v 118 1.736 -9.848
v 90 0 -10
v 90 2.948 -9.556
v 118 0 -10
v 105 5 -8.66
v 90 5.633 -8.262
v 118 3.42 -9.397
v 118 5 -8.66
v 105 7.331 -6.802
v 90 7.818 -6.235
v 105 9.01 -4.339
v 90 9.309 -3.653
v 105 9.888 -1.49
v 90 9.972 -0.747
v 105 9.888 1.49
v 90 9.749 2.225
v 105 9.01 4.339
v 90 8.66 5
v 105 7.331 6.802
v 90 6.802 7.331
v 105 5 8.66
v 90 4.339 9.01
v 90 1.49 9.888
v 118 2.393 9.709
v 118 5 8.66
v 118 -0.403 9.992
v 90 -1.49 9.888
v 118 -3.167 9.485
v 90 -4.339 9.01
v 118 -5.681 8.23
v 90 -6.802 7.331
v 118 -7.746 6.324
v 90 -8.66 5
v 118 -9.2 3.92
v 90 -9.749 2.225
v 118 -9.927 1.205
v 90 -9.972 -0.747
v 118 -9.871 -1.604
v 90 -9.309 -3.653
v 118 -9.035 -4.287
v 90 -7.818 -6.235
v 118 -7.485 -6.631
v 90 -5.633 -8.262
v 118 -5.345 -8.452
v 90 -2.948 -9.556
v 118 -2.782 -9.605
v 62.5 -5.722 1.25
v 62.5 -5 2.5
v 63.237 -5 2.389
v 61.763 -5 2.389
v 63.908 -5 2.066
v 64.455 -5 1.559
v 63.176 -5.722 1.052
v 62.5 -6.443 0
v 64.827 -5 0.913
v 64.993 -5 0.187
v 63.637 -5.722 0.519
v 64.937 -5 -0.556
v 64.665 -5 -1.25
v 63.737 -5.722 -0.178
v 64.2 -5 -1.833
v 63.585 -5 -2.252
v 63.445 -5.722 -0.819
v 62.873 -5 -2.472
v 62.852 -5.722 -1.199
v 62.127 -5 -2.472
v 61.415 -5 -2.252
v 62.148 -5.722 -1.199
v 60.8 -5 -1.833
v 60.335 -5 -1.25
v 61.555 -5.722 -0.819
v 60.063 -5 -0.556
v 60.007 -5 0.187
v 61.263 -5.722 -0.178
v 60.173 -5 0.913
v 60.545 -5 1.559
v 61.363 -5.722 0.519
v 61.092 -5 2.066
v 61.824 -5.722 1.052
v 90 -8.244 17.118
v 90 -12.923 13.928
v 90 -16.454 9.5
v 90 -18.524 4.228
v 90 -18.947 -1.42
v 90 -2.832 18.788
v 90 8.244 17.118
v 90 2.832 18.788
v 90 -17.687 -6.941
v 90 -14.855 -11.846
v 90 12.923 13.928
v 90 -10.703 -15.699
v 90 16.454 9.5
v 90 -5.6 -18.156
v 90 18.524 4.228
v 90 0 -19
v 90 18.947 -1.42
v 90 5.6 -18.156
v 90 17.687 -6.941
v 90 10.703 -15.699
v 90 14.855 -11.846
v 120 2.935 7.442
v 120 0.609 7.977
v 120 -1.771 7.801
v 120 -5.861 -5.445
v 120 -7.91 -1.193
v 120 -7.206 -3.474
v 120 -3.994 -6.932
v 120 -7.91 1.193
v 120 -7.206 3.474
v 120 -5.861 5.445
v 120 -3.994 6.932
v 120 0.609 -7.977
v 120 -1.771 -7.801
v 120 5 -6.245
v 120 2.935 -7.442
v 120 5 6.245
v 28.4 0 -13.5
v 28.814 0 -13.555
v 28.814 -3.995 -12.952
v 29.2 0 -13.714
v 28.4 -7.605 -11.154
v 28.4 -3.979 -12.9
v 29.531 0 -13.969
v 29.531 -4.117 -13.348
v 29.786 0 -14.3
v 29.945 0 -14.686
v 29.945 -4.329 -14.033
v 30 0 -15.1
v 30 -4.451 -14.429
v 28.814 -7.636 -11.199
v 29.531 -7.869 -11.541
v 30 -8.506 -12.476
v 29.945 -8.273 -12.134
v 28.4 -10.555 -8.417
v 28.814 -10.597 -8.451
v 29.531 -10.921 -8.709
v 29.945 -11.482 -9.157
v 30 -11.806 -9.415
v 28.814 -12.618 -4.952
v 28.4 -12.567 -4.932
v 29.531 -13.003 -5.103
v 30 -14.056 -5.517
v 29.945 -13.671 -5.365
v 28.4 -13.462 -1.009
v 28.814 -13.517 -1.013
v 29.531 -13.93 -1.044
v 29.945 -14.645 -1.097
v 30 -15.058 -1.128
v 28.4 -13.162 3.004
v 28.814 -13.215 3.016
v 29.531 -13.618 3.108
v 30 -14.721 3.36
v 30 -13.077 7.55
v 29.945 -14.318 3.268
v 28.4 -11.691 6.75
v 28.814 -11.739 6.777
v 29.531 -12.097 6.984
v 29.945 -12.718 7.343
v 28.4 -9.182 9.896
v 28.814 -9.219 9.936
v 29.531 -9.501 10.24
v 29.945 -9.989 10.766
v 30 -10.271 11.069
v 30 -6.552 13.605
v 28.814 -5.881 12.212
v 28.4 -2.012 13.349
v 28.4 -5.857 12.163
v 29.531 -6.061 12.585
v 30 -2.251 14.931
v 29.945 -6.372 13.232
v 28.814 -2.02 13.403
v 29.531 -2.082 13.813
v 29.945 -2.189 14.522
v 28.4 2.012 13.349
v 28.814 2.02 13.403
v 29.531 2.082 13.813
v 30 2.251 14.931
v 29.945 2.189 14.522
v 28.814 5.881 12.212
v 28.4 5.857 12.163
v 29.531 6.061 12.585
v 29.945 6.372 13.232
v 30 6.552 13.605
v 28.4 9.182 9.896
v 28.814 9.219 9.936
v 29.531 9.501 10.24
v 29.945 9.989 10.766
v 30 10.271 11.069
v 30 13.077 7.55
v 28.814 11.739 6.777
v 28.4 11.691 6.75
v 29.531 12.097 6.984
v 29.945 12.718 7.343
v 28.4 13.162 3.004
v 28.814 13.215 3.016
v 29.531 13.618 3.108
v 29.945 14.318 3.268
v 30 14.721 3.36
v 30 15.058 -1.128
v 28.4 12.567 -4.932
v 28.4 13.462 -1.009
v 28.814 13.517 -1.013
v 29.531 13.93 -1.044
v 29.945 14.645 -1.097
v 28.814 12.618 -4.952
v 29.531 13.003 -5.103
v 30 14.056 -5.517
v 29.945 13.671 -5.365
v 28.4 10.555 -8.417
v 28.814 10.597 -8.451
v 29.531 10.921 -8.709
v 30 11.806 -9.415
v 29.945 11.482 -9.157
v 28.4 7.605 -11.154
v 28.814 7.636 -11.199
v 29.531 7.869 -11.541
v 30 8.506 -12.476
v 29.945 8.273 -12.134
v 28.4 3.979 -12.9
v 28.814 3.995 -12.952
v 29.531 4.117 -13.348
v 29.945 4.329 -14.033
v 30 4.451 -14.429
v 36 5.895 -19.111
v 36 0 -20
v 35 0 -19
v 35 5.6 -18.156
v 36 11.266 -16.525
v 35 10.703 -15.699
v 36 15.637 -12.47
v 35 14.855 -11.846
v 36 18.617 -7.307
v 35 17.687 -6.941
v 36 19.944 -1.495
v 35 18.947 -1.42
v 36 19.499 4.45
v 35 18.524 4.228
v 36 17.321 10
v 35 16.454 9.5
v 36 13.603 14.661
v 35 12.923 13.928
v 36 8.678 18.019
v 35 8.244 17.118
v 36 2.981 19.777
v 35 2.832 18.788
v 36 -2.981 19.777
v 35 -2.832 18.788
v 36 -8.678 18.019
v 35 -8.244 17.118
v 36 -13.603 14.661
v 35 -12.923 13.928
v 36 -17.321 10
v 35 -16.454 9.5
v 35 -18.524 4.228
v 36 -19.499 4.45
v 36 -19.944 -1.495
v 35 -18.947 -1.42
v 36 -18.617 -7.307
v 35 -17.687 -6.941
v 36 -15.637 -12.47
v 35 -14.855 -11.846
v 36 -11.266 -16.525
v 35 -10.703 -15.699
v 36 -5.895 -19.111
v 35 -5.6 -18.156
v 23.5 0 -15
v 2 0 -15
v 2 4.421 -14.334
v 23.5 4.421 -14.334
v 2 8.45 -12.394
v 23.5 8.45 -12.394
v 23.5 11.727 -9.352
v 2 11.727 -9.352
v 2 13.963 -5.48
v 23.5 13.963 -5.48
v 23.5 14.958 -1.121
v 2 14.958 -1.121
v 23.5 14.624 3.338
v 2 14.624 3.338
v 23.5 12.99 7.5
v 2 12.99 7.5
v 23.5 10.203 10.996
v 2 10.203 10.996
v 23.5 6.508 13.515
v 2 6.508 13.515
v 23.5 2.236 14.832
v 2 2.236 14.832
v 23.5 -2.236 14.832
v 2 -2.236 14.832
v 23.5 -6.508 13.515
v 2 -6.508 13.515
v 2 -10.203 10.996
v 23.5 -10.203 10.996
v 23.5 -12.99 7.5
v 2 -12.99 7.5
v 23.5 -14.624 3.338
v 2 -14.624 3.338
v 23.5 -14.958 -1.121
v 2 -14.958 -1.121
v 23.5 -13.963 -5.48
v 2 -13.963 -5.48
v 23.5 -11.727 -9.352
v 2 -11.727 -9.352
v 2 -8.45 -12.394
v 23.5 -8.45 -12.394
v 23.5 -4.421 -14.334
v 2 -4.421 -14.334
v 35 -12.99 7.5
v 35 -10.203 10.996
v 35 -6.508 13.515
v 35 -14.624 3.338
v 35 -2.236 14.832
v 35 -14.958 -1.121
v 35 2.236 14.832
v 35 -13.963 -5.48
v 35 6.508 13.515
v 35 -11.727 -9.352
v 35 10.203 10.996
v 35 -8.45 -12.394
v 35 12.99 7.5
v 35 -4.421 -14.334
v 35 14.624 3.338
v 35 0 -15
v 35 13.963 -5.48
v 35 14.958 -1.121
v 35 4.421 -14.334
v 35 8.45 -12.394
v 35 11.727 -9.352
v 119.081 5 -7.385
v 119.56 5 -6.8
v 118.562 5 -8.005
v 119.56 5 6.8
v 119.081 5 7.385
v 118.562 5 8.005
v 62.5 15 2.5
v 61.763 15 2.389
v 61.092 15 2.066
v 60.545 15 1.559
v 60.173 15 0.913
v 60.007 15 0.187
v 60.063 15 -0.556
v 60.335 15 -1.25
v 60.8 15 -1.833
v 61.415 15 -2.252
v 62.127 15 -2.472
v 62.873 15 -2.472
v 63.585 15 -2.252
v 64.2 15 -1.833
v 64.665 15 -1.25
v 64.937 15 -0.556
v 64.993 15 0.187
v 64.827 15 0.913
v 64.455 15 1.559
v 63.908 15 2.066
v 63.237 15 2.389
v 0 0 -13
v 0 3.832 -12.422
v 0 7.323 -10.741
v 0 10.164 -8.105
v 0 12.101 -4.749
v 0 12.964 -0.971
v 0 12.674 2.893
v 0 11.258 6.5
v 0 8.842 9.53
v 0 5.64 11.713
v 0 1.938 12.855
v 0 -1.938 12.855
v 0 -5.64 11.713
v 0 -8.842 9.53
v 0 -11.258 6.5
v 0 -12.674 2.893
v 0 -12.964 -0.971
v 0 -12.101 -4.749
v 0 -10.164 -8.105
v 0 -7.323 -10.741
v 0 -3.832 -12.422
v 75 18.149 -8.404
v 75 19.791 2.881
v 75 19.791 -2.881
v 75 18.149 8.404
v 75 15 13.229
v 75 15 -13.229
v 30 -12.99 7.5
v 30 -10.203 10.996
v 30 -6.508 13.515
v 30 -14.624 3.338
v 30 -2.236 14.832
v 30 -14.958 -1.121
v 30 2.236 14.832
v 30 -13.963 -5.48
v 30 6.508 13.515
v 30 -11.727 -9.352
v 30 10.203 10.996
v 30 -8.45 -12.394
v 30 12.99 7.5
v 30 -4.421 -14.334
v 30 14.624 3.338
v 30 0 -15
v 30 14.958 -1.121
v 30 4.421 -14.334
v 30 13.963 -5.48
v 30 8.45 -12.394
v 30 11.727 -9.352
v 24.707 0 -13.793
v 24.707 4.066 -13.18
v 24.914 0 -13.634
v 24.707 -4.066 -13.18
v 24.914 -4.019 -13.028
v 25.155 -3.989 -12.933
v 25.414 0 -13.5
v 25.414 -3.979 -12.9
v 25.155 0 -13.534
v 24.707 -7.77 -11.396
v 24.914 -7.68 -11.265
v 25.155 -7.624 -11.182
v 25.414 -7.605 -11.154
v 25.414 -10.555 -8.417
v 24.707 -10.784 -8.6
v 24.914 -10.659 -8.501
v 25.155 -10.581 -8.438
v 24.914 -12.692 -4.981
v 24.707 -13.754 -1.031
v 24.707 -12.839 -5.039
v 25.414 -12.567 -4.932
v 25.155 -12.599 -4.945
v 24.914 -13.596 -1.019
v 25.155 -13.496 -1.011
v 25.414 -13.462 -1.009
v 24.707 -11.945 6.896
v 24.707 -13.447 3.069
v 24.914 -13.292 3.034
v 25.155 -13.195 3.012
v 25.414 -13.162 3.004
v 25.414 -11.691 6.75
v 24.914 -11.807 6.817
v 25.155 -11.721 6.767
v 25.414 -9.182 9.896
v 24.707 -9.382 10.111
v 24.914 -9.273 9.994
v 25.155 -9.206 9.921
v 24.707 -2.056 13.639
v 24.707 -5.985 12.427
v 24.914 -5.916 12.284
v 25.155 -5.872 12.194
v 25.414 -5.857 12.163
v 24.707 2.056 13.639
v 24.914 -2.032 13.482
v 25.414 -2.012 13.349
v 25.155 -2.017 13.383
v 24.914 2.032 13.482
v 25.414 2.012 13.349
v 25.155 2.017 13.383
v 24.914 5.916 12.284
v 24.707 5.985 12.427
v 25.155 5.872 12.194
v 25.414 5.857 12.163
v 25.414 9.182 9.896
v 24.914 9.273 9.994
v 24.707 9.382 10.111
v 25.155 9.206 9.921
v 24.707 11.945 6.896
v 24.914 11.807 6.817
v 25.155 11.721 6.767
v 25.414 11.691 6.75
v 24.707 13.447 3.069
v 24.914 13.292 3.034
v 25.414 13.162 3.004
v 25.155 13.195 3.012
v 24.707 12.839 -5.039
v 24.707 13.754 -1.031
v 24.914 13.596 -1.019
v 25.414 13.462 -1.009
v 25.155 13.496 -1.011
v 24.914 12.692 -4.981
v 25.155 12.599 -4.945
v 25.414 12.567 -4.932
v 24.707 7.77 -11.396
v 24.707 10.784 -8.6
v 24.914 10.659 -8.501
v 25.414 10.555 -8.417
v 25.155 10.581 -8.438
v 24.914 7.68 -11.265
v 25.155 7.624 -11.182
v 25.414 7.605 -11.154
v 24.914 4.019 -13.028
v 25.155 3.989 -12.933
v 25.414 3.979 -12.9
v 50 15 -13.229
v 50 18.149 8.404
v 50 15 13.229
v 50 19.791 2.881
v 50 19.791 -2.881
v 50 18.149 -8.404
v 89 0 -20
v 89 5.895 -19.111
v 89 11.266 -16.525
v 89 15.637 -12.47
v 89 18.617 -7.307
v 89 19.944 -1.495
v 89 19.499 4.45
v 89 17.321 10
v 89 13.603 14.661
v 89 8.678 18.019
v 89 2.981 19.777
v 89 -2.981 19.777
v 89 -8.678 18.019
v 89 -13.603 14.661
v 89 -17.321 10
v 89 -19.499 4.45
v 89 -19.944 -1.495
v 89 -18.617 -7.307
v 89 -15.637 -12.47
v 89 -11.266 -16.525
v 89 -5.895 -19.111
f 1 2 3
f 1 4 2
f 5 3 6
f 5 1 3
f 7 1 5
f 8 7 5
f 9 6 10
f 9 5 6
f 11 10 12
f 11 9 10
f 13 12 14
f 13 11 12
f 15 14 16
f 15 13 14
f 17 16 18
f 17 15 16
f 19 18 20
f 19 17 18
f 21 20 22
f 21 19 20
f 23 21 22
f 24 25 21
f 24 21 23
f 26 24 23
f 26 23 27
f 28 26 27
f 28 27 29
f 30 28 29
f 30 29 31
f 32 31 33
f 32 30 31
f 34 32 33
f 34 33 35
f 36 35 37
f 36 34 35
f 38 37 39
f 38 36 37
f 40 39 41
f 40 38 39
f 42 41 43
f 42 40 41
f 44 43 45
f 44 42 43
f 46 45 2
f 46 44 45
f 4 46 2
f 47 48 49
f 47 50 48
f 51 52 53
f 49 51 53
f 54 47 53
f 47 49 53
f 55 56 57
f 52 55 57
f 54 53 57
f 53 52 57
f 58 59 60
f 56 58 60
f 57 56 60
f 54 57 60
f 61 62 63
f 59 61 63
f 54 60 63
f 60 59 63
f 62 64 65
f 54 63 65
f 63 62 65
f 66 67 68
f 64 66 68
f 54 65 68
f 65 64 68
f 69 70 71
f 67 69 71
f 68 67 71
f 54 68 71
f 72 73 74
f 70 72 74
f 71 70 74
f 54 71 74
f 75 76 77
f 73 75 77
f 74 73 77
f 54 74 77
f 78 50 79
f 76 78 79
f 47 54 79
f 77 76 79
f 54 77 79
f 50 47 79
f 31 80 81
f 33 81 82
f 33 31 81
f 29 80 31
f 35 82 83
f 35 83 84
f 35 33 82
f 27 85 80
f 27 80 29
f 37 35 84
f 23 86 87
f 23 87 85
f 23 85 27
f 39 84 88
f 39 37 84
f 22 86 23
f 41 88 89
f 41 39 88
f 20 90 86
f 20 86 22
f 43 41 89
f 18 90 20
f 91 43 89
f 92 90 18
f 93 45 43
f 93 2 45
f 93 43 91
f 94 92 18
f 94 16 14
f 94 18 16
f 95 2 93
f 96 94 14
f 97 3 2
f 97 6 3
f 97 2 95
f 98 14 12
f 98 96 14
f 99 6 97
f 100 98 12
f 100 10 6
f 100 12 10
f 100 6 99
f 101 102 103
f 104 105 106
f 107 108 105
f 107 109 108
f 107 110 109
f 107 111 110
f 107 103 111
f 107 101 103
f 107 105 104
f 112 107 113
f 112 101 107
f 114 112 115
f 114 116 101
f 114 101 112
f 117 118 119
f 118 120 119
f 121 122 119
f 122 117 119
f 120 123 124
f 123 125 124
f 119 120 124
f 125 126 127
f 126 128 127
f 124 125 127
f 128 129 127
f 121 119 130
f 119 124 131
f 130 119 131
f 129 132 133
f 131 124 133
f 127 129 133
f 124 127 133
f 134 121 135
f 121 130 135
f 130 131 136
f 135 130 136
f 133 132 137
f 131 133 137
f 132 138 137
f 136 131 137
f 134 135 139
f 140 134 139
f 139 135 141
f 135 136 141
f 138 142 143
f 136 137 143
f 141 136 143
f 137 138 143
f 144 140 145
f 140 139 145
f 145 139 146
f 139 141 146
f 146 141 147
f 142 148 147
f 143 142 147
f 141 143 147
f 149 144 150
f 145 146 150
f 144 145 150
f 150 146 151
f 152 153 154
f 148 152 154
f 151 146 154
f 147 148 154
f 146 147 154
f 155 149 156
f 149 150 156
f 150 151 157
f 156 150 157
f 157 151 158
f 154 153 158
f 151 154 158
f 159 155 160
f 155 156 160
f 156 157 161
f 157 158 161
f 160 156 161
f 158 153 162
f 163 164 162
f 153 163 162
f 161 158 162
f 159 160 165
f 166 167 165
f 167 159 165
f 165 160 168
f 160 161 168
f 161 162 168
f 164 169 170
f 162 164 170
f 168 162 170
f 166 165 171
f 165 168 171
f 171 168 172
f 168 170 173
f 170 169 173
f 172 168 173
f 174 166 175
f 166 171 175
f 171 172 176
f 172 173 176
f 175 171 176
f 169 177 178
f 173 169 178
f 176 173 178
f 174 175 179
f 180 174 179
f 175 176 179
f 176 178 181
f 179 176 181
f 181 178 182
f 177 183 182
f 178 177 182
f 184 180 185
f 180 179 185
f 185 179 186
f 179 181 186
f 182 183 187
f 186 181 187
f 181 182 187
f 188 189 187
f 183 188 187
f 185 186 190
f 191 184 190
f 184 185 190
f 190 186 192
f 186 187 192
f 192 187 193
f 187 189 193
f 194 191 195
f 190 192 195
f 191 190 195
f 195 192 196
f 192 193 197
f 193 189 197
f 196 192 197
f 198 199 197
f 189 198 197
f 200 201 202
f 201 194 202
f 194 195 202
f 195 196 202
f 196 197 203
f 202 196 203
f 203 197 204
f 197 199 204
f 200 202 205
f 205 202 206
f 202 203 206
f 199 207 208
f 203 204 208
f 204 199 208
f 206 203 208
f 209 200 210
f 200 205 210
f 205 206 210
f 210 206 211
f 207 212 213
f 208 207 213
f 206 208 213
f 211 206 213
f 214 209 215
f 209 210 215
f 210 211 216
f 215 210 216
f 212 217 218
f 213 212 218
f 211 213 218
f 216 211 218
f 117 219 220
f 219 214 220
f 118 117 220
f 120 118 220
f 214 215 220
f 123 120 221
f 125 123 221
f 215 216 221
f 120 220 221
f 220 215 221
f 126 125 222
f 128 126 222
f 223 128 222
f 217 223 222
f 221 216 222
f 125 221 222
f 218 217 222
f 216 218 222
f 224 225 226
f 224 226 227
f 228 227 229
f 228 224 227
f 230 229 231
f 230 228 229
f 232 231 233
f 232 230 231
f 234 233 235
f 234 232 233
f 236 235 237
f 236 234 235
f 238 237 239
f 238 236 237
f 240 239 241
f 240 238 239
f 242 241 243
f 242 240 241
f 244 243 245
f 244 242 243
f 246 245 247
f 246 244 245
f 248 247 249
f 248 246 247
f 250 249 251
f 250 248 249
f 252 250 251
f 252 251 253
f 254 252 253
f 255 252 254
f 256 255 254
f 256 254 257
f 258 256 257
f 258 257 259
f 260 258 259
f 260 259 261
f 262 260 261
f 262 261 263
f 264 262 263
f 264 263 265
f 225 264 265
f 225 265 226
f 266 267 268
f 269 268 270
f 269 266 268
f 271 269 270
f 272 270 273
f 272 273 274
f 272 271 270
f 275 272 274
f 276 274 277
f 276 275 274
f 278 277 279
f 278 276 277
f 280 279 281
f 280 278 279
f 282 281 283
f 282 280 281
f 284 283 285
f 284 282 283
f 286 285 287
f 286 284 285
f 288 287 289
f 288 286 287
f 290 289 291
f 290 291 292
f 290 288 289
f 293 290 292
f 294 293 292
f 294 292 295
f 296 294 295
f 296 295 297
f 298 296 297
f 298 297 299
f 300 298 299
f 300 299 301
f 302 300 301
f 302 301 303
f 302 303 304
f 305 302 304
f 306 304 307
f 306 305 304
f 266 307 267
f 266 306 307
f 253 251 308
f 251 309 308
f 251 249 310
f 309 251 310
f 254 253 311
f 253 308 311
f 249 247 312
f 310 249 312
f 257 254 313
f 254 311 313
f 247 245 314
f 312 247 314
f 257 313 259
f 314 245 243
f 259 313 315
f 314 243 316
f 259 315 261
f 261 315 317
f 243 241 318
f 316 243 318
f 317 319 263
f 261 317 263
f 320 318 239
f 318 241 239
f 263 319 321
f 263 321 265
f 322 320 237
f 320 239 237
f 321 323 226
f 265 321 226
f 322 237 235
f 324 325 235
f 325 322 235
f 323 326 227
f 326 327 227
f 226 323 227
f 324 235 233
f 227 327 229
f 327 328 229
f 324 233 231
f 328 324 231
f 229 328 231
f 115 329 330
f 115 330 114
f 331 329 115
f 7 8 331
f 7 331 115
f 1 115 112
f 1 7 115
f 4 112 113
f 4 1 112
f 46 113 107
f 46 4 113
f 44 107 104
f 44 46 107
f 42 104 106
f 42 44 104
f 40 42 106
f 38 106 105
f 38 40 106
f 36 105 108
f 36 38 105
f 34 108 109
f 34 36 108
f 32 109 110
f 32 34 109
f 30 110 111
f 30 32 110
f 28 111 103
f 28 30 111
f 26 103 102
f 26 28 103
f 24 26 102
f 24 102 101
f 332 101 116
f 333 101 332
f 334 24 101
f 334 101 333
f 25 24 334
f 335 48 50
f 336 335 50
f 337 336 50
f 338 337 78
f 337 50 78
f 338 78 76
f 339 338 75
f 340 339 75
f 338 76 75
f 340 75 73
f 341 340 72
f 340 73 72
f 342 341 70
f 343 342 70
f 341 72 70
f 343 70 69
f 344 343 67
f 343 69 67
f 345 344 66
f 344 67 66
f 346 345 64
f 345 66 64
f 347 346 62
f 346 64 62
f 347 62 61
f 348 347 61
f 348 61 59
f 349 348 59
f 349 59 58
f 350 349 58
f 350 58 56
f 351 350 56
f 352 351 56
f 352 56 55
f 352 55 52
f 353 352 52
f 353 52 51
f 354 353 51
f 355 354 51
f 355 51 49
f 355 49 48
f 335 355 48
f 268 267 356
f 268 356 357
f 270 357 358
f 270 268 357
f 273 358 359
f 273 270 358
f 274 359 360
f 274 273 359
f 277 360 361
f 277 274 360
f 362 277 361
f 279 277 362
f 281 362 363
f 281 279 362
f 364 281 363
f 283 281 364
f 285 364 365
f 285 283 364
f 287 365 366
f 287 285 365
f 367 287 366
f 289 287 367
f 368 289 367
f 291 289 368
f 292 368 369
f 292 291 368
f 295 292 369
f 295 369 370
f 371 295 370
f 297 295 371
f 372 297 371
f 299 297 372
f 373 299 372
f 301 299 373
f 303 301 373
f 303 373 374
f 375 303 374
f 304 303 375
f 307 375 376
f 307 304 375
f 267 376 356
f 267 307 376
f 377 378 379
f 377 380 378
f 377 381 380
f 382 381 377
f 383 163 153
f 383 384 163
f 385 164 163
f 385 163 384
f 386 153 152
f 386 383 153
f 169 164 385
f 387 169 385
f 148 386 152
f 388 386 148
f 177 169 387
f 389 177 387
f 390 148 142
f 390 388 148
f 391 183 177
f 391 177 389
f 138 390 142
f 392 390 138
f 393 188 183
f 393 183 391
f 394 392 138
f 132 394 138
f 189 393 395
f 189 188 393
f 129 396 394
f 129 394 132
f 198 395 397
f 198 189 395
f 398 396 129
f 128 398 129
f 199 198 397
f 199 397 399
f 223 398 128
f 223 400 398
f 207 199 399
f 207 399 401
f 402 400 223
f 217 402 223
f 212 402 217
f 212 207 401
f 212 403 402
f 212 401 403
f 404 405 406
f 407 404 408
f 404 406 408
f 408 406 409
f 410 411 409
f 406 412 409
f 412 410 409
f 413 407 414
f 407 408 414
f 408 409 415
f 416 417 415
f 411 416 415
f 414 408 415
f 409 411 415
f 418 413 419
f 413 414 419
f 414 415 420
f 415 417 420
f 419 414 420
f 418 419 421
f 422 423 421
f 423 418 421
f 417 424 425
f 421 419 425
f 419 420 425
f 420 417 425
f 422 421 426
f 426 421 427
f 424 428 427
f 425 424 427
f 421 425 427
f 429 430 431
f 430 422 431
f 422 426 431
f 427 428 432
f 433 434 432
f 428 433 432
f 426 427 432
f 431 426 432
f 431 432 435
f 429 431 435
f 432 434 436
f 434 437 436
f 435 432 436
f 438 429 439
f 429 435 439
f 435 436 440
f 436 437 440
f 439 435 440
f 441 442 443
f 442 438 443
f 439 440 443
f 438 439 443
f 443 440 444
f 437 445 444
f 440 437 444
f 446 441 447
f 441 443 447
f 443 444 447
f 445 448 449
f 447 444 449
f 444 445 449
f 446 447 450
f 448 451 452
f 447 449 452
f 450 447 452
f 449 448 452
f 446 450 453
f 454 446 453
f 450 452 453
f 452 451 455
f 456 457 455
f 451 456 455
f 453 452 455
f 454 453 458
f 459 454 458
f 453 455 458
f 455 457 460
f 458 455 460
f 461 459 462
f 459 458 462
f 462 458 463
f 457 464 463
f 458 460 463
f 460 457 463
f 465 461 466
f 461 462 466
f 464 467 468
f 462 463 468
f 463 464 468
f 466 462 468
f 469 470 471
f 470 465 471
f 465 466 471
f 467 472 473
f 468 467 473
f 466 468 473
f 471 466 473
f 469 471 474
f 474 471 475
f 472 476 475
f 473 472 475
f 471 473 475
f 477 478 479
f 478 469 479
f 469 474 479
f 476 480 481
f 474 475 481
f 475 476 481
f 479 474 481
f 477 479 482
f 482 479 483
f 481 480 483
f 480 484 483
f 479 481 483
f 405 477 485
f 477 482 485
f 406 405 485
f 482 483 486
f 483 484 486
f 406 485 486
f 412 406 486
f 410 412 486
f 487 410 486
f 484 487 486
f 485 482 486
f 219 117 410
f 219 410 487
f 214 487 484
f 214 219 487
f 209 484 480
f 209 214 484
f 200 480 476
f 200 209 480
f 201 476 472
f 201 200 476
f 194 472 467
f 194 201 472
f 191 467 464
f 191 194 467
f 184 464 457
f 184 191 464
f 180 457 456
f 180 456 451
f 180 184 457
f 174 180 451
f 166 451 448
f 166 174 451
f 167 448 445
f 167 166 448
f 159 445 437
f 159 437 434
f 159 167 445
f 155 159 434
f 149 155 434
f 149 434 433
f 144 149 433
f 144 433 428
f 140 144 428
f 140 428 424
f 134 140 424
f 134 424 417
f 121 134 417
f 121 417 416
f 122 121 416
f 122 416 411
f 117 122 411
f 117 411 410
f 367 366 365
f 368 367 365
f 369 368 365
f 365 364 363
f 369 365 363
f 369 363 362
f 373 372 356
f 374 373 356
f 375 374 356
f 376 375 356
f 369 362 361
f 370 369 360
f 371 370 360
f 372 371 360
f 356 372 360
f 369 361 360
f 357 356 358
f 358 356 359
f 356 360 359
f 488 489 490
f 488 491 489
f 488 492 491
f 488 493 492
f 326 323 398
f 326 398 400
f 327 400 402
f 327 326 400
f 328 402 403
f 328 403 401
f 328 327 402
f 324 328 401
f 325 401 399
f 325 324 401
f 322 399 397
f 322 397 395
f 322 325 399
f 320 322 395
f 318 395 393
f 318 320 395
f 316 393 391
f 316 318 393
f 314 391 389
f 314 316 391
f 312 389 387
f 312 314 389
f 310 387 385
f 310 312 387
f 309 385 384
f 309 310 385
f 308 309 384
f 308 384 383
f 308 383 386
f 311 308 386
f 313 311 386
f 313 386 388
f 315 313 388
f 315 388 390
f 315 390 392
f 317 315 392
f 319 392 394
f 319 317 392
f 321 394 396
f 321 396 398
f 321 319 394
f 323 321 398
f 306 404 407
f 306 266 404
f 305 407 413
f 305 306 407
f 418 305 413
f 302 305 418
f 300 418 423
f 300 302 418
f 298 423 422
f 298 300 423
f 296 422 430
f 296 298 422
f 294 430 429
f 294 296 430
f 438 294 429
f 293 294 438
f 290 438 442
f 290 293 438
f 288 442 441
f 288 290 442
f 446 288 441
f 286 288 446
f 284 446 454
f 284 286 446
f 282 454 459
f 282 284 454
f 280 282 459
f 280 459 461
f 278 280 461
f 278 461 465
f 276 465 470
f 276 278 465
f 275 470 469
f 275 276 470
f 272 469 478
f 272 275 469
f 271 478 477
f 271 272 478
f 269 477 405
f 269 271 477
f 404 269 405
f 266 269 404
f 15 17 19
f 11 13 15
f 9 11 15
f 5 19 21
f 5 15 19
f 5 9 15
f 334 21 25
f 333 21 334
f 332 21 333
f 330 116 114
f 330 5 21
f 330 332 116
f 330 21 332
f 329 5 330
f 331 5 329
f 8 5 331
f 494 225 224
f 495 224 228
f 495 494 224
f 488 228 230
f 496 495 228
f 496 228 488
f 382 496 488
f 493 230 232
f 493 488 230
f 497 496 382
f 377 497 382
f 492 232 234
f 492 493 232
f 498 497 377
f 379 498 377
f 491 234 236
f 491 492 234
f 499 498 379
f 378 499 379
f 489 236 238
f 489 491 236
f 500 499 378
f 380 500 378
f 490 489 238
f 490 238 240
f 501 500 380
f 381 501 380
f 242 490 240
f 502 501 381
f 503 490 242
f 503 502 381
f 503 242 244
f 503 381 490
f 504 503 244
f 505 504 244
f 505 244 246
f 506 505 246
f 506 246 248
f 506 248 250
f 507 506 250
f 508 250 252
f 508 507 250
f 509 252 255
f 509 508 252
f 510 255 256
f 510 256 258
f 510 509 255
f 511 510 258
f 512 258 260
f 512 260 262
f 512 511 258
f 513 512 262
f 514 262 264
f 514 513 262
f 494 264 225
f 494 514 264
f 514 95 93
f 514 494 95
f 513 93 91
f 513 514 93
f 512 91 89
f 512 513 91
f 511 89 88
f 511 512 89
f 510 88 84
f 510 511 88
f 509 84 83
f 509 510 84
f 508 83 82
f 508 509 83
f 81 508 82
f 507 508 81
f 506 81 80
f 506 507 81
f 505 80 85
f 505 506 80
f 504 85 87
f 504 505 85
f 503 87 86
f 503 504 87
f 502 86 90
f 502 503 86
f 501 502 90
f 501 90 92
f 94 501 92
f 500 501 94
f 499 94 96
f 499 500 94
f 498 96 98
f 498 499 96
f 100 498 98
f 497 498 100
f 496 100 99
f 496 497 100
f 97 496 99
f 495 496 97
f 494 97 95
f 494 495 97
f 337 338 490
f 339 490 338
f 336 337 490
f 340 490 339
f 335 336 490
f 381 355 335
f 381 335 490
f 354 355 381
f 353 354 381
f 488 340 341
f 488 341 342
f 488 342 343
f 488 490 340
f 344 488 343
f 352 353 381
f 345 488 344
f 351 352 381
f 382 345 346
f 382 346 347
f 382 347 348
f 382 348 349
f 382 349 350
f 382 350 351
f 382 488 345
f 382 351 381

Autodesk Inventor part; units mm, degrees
ref_plane "YZ Plane" through (0, 0, 0) normal (1, 0, 0) x (0, 1, 0)
ref_plane "XZ Plane" through (0, 0, 0) normal (0, 1, 0) x (-1, 0, 0)
ref_plane "XY Plane" through (0, 0, 0) normal (0, 0, 1) x (1, 0, 0)
sketch "Эскиз1" plane through (0, 0, 0) normal (0, 1, 0) x (-1, 0, 0)
  line L0 (0, 0) -> (0, -15)
  line L1 (0, -15) -> (-23.5, -15)
  line L2 (-23.5, -15) -> (-24.7071, -13.7929)
  line L3 (-25.4142, -13.5) -> (-28.4, -13.5)
  line L4 (-35, -20) -> (-90, -20)
  line L5 (-90, -20) -> (-90, -10)
  line L6 (-90, -10) -> (-120, -10)
  line L7 (-120, -10) -> (-120, 0)
  line L8 (-30, -15.1) -> (-30, -15)
  line L9 (-30, -15) -> (-35, -15)
  line L10 (-35, -15) -> (-35, -20)
  line L11 (0, 0) -> (-120, 0)
  line L12 (24, 0) -> (-144, 0) projected
  arc A0 (-24.7071, -13.7929) -> (-25.4142, -13.5) centre (-25.4142, -14.5) ccw
  arc A1 (-28.4, -13.5) -> (-30, -15.1) centre (-28.4, -15.1) ccw
  point P0 (-25, -13.5)
  point P1 (-30, -13.5)
  dimension "d3" = 45
  dimension "d6" = 5
  dimension "d8" = 30
  dimension "d9" = 35
  dimension "d11" = 55
  dimension "d14" = 15
  dimension "d15" = 13.5
  dimension "d16" = 15
  dimension "d17" = 20
  dimension "d18" = 10
  dimension "d19" = 120
  dimension "d20" = 1
  dimension "d21" = 1.6
revolve "Вращение1" add sketch "Эскиз1" angle 360 about axis through (-10, 0, 0) along (1, 0, 0)
thread "Резьба1" size "M30x2" class "6g" standard "ANSI Metric M Profile" full length
chamfer "Фаска1" distance 2 angle 45 2 edges at (0, 0, 15) (120, 0, 10)
chamfer "Фаска2" distance 1 angle 45 2 edges at (35, 0, 20) (90, 0, 20)
sketch "Эскиз2" plane through (0, 0, 0) normal (0, 0, 1) x (1, 0, 0)
  line L0 (105, 10) -> (105, 5)
  line L1 (105, 5) -> (120, 5)
  line L2 (120, 5) -> (120, 10)
  line L3 (120, 10) -> (105, 10)
  line L4 (120, 8) -> (120, -8) projected
  line L5 (90, 10) -> (118, 10) projected
  line L6 (90, -10) -> (118, -10) projected
  point P0 (0, 0)
  dimension "d30" = 15
  dimension "d31" = 15
extrude "Выдавливание1" cut sketch "Эскиз2" along normal through all both and the other way through all
sketch "Эскиз3" plane through (0, 0, 0) normal (0, 0, 1) x (1, 0, 0)
  line L0 (50, 20) -> (50, 15)
  line L1 (50, 15) -> (75, 15)
  line L2 (75, 15) -> (75, 20)
  line L3 (75, 20) -> (50, 20)
  line L4 (35, -19) -> (35, 19) projected
  line L5 (36, 20) -> (89, 20) projected
  line L6 (36, -20) -> (89, -20) projected
  point P0 (0, 0)
  dimension "d34" = 35
  dimension "d35" = 15
  dimension "d36" = 25
extrude "Выдавливание2" cut sketch "Эскиз3" along normal through all both and the other way through all
sketch "Эскиз4" plane through (50, 15, -13.2288) normal (0, 1, 0) x (1, 0, 0)
  line L0 (-74, -13.2288) -> (94, -13.2288) projected
  line L1 (0, 0) -> (0, -26.4575) projected
  point P0 (-50, -13.2288)
  point P1 (12.5, -13.2288)
  dimension "d39" = 12.5
hole "Отверстие1" at (62.5, 15, 0) direction (0, -1, 0) diameter 5 depth 20 tip angle 120
properties part number "Вал"
